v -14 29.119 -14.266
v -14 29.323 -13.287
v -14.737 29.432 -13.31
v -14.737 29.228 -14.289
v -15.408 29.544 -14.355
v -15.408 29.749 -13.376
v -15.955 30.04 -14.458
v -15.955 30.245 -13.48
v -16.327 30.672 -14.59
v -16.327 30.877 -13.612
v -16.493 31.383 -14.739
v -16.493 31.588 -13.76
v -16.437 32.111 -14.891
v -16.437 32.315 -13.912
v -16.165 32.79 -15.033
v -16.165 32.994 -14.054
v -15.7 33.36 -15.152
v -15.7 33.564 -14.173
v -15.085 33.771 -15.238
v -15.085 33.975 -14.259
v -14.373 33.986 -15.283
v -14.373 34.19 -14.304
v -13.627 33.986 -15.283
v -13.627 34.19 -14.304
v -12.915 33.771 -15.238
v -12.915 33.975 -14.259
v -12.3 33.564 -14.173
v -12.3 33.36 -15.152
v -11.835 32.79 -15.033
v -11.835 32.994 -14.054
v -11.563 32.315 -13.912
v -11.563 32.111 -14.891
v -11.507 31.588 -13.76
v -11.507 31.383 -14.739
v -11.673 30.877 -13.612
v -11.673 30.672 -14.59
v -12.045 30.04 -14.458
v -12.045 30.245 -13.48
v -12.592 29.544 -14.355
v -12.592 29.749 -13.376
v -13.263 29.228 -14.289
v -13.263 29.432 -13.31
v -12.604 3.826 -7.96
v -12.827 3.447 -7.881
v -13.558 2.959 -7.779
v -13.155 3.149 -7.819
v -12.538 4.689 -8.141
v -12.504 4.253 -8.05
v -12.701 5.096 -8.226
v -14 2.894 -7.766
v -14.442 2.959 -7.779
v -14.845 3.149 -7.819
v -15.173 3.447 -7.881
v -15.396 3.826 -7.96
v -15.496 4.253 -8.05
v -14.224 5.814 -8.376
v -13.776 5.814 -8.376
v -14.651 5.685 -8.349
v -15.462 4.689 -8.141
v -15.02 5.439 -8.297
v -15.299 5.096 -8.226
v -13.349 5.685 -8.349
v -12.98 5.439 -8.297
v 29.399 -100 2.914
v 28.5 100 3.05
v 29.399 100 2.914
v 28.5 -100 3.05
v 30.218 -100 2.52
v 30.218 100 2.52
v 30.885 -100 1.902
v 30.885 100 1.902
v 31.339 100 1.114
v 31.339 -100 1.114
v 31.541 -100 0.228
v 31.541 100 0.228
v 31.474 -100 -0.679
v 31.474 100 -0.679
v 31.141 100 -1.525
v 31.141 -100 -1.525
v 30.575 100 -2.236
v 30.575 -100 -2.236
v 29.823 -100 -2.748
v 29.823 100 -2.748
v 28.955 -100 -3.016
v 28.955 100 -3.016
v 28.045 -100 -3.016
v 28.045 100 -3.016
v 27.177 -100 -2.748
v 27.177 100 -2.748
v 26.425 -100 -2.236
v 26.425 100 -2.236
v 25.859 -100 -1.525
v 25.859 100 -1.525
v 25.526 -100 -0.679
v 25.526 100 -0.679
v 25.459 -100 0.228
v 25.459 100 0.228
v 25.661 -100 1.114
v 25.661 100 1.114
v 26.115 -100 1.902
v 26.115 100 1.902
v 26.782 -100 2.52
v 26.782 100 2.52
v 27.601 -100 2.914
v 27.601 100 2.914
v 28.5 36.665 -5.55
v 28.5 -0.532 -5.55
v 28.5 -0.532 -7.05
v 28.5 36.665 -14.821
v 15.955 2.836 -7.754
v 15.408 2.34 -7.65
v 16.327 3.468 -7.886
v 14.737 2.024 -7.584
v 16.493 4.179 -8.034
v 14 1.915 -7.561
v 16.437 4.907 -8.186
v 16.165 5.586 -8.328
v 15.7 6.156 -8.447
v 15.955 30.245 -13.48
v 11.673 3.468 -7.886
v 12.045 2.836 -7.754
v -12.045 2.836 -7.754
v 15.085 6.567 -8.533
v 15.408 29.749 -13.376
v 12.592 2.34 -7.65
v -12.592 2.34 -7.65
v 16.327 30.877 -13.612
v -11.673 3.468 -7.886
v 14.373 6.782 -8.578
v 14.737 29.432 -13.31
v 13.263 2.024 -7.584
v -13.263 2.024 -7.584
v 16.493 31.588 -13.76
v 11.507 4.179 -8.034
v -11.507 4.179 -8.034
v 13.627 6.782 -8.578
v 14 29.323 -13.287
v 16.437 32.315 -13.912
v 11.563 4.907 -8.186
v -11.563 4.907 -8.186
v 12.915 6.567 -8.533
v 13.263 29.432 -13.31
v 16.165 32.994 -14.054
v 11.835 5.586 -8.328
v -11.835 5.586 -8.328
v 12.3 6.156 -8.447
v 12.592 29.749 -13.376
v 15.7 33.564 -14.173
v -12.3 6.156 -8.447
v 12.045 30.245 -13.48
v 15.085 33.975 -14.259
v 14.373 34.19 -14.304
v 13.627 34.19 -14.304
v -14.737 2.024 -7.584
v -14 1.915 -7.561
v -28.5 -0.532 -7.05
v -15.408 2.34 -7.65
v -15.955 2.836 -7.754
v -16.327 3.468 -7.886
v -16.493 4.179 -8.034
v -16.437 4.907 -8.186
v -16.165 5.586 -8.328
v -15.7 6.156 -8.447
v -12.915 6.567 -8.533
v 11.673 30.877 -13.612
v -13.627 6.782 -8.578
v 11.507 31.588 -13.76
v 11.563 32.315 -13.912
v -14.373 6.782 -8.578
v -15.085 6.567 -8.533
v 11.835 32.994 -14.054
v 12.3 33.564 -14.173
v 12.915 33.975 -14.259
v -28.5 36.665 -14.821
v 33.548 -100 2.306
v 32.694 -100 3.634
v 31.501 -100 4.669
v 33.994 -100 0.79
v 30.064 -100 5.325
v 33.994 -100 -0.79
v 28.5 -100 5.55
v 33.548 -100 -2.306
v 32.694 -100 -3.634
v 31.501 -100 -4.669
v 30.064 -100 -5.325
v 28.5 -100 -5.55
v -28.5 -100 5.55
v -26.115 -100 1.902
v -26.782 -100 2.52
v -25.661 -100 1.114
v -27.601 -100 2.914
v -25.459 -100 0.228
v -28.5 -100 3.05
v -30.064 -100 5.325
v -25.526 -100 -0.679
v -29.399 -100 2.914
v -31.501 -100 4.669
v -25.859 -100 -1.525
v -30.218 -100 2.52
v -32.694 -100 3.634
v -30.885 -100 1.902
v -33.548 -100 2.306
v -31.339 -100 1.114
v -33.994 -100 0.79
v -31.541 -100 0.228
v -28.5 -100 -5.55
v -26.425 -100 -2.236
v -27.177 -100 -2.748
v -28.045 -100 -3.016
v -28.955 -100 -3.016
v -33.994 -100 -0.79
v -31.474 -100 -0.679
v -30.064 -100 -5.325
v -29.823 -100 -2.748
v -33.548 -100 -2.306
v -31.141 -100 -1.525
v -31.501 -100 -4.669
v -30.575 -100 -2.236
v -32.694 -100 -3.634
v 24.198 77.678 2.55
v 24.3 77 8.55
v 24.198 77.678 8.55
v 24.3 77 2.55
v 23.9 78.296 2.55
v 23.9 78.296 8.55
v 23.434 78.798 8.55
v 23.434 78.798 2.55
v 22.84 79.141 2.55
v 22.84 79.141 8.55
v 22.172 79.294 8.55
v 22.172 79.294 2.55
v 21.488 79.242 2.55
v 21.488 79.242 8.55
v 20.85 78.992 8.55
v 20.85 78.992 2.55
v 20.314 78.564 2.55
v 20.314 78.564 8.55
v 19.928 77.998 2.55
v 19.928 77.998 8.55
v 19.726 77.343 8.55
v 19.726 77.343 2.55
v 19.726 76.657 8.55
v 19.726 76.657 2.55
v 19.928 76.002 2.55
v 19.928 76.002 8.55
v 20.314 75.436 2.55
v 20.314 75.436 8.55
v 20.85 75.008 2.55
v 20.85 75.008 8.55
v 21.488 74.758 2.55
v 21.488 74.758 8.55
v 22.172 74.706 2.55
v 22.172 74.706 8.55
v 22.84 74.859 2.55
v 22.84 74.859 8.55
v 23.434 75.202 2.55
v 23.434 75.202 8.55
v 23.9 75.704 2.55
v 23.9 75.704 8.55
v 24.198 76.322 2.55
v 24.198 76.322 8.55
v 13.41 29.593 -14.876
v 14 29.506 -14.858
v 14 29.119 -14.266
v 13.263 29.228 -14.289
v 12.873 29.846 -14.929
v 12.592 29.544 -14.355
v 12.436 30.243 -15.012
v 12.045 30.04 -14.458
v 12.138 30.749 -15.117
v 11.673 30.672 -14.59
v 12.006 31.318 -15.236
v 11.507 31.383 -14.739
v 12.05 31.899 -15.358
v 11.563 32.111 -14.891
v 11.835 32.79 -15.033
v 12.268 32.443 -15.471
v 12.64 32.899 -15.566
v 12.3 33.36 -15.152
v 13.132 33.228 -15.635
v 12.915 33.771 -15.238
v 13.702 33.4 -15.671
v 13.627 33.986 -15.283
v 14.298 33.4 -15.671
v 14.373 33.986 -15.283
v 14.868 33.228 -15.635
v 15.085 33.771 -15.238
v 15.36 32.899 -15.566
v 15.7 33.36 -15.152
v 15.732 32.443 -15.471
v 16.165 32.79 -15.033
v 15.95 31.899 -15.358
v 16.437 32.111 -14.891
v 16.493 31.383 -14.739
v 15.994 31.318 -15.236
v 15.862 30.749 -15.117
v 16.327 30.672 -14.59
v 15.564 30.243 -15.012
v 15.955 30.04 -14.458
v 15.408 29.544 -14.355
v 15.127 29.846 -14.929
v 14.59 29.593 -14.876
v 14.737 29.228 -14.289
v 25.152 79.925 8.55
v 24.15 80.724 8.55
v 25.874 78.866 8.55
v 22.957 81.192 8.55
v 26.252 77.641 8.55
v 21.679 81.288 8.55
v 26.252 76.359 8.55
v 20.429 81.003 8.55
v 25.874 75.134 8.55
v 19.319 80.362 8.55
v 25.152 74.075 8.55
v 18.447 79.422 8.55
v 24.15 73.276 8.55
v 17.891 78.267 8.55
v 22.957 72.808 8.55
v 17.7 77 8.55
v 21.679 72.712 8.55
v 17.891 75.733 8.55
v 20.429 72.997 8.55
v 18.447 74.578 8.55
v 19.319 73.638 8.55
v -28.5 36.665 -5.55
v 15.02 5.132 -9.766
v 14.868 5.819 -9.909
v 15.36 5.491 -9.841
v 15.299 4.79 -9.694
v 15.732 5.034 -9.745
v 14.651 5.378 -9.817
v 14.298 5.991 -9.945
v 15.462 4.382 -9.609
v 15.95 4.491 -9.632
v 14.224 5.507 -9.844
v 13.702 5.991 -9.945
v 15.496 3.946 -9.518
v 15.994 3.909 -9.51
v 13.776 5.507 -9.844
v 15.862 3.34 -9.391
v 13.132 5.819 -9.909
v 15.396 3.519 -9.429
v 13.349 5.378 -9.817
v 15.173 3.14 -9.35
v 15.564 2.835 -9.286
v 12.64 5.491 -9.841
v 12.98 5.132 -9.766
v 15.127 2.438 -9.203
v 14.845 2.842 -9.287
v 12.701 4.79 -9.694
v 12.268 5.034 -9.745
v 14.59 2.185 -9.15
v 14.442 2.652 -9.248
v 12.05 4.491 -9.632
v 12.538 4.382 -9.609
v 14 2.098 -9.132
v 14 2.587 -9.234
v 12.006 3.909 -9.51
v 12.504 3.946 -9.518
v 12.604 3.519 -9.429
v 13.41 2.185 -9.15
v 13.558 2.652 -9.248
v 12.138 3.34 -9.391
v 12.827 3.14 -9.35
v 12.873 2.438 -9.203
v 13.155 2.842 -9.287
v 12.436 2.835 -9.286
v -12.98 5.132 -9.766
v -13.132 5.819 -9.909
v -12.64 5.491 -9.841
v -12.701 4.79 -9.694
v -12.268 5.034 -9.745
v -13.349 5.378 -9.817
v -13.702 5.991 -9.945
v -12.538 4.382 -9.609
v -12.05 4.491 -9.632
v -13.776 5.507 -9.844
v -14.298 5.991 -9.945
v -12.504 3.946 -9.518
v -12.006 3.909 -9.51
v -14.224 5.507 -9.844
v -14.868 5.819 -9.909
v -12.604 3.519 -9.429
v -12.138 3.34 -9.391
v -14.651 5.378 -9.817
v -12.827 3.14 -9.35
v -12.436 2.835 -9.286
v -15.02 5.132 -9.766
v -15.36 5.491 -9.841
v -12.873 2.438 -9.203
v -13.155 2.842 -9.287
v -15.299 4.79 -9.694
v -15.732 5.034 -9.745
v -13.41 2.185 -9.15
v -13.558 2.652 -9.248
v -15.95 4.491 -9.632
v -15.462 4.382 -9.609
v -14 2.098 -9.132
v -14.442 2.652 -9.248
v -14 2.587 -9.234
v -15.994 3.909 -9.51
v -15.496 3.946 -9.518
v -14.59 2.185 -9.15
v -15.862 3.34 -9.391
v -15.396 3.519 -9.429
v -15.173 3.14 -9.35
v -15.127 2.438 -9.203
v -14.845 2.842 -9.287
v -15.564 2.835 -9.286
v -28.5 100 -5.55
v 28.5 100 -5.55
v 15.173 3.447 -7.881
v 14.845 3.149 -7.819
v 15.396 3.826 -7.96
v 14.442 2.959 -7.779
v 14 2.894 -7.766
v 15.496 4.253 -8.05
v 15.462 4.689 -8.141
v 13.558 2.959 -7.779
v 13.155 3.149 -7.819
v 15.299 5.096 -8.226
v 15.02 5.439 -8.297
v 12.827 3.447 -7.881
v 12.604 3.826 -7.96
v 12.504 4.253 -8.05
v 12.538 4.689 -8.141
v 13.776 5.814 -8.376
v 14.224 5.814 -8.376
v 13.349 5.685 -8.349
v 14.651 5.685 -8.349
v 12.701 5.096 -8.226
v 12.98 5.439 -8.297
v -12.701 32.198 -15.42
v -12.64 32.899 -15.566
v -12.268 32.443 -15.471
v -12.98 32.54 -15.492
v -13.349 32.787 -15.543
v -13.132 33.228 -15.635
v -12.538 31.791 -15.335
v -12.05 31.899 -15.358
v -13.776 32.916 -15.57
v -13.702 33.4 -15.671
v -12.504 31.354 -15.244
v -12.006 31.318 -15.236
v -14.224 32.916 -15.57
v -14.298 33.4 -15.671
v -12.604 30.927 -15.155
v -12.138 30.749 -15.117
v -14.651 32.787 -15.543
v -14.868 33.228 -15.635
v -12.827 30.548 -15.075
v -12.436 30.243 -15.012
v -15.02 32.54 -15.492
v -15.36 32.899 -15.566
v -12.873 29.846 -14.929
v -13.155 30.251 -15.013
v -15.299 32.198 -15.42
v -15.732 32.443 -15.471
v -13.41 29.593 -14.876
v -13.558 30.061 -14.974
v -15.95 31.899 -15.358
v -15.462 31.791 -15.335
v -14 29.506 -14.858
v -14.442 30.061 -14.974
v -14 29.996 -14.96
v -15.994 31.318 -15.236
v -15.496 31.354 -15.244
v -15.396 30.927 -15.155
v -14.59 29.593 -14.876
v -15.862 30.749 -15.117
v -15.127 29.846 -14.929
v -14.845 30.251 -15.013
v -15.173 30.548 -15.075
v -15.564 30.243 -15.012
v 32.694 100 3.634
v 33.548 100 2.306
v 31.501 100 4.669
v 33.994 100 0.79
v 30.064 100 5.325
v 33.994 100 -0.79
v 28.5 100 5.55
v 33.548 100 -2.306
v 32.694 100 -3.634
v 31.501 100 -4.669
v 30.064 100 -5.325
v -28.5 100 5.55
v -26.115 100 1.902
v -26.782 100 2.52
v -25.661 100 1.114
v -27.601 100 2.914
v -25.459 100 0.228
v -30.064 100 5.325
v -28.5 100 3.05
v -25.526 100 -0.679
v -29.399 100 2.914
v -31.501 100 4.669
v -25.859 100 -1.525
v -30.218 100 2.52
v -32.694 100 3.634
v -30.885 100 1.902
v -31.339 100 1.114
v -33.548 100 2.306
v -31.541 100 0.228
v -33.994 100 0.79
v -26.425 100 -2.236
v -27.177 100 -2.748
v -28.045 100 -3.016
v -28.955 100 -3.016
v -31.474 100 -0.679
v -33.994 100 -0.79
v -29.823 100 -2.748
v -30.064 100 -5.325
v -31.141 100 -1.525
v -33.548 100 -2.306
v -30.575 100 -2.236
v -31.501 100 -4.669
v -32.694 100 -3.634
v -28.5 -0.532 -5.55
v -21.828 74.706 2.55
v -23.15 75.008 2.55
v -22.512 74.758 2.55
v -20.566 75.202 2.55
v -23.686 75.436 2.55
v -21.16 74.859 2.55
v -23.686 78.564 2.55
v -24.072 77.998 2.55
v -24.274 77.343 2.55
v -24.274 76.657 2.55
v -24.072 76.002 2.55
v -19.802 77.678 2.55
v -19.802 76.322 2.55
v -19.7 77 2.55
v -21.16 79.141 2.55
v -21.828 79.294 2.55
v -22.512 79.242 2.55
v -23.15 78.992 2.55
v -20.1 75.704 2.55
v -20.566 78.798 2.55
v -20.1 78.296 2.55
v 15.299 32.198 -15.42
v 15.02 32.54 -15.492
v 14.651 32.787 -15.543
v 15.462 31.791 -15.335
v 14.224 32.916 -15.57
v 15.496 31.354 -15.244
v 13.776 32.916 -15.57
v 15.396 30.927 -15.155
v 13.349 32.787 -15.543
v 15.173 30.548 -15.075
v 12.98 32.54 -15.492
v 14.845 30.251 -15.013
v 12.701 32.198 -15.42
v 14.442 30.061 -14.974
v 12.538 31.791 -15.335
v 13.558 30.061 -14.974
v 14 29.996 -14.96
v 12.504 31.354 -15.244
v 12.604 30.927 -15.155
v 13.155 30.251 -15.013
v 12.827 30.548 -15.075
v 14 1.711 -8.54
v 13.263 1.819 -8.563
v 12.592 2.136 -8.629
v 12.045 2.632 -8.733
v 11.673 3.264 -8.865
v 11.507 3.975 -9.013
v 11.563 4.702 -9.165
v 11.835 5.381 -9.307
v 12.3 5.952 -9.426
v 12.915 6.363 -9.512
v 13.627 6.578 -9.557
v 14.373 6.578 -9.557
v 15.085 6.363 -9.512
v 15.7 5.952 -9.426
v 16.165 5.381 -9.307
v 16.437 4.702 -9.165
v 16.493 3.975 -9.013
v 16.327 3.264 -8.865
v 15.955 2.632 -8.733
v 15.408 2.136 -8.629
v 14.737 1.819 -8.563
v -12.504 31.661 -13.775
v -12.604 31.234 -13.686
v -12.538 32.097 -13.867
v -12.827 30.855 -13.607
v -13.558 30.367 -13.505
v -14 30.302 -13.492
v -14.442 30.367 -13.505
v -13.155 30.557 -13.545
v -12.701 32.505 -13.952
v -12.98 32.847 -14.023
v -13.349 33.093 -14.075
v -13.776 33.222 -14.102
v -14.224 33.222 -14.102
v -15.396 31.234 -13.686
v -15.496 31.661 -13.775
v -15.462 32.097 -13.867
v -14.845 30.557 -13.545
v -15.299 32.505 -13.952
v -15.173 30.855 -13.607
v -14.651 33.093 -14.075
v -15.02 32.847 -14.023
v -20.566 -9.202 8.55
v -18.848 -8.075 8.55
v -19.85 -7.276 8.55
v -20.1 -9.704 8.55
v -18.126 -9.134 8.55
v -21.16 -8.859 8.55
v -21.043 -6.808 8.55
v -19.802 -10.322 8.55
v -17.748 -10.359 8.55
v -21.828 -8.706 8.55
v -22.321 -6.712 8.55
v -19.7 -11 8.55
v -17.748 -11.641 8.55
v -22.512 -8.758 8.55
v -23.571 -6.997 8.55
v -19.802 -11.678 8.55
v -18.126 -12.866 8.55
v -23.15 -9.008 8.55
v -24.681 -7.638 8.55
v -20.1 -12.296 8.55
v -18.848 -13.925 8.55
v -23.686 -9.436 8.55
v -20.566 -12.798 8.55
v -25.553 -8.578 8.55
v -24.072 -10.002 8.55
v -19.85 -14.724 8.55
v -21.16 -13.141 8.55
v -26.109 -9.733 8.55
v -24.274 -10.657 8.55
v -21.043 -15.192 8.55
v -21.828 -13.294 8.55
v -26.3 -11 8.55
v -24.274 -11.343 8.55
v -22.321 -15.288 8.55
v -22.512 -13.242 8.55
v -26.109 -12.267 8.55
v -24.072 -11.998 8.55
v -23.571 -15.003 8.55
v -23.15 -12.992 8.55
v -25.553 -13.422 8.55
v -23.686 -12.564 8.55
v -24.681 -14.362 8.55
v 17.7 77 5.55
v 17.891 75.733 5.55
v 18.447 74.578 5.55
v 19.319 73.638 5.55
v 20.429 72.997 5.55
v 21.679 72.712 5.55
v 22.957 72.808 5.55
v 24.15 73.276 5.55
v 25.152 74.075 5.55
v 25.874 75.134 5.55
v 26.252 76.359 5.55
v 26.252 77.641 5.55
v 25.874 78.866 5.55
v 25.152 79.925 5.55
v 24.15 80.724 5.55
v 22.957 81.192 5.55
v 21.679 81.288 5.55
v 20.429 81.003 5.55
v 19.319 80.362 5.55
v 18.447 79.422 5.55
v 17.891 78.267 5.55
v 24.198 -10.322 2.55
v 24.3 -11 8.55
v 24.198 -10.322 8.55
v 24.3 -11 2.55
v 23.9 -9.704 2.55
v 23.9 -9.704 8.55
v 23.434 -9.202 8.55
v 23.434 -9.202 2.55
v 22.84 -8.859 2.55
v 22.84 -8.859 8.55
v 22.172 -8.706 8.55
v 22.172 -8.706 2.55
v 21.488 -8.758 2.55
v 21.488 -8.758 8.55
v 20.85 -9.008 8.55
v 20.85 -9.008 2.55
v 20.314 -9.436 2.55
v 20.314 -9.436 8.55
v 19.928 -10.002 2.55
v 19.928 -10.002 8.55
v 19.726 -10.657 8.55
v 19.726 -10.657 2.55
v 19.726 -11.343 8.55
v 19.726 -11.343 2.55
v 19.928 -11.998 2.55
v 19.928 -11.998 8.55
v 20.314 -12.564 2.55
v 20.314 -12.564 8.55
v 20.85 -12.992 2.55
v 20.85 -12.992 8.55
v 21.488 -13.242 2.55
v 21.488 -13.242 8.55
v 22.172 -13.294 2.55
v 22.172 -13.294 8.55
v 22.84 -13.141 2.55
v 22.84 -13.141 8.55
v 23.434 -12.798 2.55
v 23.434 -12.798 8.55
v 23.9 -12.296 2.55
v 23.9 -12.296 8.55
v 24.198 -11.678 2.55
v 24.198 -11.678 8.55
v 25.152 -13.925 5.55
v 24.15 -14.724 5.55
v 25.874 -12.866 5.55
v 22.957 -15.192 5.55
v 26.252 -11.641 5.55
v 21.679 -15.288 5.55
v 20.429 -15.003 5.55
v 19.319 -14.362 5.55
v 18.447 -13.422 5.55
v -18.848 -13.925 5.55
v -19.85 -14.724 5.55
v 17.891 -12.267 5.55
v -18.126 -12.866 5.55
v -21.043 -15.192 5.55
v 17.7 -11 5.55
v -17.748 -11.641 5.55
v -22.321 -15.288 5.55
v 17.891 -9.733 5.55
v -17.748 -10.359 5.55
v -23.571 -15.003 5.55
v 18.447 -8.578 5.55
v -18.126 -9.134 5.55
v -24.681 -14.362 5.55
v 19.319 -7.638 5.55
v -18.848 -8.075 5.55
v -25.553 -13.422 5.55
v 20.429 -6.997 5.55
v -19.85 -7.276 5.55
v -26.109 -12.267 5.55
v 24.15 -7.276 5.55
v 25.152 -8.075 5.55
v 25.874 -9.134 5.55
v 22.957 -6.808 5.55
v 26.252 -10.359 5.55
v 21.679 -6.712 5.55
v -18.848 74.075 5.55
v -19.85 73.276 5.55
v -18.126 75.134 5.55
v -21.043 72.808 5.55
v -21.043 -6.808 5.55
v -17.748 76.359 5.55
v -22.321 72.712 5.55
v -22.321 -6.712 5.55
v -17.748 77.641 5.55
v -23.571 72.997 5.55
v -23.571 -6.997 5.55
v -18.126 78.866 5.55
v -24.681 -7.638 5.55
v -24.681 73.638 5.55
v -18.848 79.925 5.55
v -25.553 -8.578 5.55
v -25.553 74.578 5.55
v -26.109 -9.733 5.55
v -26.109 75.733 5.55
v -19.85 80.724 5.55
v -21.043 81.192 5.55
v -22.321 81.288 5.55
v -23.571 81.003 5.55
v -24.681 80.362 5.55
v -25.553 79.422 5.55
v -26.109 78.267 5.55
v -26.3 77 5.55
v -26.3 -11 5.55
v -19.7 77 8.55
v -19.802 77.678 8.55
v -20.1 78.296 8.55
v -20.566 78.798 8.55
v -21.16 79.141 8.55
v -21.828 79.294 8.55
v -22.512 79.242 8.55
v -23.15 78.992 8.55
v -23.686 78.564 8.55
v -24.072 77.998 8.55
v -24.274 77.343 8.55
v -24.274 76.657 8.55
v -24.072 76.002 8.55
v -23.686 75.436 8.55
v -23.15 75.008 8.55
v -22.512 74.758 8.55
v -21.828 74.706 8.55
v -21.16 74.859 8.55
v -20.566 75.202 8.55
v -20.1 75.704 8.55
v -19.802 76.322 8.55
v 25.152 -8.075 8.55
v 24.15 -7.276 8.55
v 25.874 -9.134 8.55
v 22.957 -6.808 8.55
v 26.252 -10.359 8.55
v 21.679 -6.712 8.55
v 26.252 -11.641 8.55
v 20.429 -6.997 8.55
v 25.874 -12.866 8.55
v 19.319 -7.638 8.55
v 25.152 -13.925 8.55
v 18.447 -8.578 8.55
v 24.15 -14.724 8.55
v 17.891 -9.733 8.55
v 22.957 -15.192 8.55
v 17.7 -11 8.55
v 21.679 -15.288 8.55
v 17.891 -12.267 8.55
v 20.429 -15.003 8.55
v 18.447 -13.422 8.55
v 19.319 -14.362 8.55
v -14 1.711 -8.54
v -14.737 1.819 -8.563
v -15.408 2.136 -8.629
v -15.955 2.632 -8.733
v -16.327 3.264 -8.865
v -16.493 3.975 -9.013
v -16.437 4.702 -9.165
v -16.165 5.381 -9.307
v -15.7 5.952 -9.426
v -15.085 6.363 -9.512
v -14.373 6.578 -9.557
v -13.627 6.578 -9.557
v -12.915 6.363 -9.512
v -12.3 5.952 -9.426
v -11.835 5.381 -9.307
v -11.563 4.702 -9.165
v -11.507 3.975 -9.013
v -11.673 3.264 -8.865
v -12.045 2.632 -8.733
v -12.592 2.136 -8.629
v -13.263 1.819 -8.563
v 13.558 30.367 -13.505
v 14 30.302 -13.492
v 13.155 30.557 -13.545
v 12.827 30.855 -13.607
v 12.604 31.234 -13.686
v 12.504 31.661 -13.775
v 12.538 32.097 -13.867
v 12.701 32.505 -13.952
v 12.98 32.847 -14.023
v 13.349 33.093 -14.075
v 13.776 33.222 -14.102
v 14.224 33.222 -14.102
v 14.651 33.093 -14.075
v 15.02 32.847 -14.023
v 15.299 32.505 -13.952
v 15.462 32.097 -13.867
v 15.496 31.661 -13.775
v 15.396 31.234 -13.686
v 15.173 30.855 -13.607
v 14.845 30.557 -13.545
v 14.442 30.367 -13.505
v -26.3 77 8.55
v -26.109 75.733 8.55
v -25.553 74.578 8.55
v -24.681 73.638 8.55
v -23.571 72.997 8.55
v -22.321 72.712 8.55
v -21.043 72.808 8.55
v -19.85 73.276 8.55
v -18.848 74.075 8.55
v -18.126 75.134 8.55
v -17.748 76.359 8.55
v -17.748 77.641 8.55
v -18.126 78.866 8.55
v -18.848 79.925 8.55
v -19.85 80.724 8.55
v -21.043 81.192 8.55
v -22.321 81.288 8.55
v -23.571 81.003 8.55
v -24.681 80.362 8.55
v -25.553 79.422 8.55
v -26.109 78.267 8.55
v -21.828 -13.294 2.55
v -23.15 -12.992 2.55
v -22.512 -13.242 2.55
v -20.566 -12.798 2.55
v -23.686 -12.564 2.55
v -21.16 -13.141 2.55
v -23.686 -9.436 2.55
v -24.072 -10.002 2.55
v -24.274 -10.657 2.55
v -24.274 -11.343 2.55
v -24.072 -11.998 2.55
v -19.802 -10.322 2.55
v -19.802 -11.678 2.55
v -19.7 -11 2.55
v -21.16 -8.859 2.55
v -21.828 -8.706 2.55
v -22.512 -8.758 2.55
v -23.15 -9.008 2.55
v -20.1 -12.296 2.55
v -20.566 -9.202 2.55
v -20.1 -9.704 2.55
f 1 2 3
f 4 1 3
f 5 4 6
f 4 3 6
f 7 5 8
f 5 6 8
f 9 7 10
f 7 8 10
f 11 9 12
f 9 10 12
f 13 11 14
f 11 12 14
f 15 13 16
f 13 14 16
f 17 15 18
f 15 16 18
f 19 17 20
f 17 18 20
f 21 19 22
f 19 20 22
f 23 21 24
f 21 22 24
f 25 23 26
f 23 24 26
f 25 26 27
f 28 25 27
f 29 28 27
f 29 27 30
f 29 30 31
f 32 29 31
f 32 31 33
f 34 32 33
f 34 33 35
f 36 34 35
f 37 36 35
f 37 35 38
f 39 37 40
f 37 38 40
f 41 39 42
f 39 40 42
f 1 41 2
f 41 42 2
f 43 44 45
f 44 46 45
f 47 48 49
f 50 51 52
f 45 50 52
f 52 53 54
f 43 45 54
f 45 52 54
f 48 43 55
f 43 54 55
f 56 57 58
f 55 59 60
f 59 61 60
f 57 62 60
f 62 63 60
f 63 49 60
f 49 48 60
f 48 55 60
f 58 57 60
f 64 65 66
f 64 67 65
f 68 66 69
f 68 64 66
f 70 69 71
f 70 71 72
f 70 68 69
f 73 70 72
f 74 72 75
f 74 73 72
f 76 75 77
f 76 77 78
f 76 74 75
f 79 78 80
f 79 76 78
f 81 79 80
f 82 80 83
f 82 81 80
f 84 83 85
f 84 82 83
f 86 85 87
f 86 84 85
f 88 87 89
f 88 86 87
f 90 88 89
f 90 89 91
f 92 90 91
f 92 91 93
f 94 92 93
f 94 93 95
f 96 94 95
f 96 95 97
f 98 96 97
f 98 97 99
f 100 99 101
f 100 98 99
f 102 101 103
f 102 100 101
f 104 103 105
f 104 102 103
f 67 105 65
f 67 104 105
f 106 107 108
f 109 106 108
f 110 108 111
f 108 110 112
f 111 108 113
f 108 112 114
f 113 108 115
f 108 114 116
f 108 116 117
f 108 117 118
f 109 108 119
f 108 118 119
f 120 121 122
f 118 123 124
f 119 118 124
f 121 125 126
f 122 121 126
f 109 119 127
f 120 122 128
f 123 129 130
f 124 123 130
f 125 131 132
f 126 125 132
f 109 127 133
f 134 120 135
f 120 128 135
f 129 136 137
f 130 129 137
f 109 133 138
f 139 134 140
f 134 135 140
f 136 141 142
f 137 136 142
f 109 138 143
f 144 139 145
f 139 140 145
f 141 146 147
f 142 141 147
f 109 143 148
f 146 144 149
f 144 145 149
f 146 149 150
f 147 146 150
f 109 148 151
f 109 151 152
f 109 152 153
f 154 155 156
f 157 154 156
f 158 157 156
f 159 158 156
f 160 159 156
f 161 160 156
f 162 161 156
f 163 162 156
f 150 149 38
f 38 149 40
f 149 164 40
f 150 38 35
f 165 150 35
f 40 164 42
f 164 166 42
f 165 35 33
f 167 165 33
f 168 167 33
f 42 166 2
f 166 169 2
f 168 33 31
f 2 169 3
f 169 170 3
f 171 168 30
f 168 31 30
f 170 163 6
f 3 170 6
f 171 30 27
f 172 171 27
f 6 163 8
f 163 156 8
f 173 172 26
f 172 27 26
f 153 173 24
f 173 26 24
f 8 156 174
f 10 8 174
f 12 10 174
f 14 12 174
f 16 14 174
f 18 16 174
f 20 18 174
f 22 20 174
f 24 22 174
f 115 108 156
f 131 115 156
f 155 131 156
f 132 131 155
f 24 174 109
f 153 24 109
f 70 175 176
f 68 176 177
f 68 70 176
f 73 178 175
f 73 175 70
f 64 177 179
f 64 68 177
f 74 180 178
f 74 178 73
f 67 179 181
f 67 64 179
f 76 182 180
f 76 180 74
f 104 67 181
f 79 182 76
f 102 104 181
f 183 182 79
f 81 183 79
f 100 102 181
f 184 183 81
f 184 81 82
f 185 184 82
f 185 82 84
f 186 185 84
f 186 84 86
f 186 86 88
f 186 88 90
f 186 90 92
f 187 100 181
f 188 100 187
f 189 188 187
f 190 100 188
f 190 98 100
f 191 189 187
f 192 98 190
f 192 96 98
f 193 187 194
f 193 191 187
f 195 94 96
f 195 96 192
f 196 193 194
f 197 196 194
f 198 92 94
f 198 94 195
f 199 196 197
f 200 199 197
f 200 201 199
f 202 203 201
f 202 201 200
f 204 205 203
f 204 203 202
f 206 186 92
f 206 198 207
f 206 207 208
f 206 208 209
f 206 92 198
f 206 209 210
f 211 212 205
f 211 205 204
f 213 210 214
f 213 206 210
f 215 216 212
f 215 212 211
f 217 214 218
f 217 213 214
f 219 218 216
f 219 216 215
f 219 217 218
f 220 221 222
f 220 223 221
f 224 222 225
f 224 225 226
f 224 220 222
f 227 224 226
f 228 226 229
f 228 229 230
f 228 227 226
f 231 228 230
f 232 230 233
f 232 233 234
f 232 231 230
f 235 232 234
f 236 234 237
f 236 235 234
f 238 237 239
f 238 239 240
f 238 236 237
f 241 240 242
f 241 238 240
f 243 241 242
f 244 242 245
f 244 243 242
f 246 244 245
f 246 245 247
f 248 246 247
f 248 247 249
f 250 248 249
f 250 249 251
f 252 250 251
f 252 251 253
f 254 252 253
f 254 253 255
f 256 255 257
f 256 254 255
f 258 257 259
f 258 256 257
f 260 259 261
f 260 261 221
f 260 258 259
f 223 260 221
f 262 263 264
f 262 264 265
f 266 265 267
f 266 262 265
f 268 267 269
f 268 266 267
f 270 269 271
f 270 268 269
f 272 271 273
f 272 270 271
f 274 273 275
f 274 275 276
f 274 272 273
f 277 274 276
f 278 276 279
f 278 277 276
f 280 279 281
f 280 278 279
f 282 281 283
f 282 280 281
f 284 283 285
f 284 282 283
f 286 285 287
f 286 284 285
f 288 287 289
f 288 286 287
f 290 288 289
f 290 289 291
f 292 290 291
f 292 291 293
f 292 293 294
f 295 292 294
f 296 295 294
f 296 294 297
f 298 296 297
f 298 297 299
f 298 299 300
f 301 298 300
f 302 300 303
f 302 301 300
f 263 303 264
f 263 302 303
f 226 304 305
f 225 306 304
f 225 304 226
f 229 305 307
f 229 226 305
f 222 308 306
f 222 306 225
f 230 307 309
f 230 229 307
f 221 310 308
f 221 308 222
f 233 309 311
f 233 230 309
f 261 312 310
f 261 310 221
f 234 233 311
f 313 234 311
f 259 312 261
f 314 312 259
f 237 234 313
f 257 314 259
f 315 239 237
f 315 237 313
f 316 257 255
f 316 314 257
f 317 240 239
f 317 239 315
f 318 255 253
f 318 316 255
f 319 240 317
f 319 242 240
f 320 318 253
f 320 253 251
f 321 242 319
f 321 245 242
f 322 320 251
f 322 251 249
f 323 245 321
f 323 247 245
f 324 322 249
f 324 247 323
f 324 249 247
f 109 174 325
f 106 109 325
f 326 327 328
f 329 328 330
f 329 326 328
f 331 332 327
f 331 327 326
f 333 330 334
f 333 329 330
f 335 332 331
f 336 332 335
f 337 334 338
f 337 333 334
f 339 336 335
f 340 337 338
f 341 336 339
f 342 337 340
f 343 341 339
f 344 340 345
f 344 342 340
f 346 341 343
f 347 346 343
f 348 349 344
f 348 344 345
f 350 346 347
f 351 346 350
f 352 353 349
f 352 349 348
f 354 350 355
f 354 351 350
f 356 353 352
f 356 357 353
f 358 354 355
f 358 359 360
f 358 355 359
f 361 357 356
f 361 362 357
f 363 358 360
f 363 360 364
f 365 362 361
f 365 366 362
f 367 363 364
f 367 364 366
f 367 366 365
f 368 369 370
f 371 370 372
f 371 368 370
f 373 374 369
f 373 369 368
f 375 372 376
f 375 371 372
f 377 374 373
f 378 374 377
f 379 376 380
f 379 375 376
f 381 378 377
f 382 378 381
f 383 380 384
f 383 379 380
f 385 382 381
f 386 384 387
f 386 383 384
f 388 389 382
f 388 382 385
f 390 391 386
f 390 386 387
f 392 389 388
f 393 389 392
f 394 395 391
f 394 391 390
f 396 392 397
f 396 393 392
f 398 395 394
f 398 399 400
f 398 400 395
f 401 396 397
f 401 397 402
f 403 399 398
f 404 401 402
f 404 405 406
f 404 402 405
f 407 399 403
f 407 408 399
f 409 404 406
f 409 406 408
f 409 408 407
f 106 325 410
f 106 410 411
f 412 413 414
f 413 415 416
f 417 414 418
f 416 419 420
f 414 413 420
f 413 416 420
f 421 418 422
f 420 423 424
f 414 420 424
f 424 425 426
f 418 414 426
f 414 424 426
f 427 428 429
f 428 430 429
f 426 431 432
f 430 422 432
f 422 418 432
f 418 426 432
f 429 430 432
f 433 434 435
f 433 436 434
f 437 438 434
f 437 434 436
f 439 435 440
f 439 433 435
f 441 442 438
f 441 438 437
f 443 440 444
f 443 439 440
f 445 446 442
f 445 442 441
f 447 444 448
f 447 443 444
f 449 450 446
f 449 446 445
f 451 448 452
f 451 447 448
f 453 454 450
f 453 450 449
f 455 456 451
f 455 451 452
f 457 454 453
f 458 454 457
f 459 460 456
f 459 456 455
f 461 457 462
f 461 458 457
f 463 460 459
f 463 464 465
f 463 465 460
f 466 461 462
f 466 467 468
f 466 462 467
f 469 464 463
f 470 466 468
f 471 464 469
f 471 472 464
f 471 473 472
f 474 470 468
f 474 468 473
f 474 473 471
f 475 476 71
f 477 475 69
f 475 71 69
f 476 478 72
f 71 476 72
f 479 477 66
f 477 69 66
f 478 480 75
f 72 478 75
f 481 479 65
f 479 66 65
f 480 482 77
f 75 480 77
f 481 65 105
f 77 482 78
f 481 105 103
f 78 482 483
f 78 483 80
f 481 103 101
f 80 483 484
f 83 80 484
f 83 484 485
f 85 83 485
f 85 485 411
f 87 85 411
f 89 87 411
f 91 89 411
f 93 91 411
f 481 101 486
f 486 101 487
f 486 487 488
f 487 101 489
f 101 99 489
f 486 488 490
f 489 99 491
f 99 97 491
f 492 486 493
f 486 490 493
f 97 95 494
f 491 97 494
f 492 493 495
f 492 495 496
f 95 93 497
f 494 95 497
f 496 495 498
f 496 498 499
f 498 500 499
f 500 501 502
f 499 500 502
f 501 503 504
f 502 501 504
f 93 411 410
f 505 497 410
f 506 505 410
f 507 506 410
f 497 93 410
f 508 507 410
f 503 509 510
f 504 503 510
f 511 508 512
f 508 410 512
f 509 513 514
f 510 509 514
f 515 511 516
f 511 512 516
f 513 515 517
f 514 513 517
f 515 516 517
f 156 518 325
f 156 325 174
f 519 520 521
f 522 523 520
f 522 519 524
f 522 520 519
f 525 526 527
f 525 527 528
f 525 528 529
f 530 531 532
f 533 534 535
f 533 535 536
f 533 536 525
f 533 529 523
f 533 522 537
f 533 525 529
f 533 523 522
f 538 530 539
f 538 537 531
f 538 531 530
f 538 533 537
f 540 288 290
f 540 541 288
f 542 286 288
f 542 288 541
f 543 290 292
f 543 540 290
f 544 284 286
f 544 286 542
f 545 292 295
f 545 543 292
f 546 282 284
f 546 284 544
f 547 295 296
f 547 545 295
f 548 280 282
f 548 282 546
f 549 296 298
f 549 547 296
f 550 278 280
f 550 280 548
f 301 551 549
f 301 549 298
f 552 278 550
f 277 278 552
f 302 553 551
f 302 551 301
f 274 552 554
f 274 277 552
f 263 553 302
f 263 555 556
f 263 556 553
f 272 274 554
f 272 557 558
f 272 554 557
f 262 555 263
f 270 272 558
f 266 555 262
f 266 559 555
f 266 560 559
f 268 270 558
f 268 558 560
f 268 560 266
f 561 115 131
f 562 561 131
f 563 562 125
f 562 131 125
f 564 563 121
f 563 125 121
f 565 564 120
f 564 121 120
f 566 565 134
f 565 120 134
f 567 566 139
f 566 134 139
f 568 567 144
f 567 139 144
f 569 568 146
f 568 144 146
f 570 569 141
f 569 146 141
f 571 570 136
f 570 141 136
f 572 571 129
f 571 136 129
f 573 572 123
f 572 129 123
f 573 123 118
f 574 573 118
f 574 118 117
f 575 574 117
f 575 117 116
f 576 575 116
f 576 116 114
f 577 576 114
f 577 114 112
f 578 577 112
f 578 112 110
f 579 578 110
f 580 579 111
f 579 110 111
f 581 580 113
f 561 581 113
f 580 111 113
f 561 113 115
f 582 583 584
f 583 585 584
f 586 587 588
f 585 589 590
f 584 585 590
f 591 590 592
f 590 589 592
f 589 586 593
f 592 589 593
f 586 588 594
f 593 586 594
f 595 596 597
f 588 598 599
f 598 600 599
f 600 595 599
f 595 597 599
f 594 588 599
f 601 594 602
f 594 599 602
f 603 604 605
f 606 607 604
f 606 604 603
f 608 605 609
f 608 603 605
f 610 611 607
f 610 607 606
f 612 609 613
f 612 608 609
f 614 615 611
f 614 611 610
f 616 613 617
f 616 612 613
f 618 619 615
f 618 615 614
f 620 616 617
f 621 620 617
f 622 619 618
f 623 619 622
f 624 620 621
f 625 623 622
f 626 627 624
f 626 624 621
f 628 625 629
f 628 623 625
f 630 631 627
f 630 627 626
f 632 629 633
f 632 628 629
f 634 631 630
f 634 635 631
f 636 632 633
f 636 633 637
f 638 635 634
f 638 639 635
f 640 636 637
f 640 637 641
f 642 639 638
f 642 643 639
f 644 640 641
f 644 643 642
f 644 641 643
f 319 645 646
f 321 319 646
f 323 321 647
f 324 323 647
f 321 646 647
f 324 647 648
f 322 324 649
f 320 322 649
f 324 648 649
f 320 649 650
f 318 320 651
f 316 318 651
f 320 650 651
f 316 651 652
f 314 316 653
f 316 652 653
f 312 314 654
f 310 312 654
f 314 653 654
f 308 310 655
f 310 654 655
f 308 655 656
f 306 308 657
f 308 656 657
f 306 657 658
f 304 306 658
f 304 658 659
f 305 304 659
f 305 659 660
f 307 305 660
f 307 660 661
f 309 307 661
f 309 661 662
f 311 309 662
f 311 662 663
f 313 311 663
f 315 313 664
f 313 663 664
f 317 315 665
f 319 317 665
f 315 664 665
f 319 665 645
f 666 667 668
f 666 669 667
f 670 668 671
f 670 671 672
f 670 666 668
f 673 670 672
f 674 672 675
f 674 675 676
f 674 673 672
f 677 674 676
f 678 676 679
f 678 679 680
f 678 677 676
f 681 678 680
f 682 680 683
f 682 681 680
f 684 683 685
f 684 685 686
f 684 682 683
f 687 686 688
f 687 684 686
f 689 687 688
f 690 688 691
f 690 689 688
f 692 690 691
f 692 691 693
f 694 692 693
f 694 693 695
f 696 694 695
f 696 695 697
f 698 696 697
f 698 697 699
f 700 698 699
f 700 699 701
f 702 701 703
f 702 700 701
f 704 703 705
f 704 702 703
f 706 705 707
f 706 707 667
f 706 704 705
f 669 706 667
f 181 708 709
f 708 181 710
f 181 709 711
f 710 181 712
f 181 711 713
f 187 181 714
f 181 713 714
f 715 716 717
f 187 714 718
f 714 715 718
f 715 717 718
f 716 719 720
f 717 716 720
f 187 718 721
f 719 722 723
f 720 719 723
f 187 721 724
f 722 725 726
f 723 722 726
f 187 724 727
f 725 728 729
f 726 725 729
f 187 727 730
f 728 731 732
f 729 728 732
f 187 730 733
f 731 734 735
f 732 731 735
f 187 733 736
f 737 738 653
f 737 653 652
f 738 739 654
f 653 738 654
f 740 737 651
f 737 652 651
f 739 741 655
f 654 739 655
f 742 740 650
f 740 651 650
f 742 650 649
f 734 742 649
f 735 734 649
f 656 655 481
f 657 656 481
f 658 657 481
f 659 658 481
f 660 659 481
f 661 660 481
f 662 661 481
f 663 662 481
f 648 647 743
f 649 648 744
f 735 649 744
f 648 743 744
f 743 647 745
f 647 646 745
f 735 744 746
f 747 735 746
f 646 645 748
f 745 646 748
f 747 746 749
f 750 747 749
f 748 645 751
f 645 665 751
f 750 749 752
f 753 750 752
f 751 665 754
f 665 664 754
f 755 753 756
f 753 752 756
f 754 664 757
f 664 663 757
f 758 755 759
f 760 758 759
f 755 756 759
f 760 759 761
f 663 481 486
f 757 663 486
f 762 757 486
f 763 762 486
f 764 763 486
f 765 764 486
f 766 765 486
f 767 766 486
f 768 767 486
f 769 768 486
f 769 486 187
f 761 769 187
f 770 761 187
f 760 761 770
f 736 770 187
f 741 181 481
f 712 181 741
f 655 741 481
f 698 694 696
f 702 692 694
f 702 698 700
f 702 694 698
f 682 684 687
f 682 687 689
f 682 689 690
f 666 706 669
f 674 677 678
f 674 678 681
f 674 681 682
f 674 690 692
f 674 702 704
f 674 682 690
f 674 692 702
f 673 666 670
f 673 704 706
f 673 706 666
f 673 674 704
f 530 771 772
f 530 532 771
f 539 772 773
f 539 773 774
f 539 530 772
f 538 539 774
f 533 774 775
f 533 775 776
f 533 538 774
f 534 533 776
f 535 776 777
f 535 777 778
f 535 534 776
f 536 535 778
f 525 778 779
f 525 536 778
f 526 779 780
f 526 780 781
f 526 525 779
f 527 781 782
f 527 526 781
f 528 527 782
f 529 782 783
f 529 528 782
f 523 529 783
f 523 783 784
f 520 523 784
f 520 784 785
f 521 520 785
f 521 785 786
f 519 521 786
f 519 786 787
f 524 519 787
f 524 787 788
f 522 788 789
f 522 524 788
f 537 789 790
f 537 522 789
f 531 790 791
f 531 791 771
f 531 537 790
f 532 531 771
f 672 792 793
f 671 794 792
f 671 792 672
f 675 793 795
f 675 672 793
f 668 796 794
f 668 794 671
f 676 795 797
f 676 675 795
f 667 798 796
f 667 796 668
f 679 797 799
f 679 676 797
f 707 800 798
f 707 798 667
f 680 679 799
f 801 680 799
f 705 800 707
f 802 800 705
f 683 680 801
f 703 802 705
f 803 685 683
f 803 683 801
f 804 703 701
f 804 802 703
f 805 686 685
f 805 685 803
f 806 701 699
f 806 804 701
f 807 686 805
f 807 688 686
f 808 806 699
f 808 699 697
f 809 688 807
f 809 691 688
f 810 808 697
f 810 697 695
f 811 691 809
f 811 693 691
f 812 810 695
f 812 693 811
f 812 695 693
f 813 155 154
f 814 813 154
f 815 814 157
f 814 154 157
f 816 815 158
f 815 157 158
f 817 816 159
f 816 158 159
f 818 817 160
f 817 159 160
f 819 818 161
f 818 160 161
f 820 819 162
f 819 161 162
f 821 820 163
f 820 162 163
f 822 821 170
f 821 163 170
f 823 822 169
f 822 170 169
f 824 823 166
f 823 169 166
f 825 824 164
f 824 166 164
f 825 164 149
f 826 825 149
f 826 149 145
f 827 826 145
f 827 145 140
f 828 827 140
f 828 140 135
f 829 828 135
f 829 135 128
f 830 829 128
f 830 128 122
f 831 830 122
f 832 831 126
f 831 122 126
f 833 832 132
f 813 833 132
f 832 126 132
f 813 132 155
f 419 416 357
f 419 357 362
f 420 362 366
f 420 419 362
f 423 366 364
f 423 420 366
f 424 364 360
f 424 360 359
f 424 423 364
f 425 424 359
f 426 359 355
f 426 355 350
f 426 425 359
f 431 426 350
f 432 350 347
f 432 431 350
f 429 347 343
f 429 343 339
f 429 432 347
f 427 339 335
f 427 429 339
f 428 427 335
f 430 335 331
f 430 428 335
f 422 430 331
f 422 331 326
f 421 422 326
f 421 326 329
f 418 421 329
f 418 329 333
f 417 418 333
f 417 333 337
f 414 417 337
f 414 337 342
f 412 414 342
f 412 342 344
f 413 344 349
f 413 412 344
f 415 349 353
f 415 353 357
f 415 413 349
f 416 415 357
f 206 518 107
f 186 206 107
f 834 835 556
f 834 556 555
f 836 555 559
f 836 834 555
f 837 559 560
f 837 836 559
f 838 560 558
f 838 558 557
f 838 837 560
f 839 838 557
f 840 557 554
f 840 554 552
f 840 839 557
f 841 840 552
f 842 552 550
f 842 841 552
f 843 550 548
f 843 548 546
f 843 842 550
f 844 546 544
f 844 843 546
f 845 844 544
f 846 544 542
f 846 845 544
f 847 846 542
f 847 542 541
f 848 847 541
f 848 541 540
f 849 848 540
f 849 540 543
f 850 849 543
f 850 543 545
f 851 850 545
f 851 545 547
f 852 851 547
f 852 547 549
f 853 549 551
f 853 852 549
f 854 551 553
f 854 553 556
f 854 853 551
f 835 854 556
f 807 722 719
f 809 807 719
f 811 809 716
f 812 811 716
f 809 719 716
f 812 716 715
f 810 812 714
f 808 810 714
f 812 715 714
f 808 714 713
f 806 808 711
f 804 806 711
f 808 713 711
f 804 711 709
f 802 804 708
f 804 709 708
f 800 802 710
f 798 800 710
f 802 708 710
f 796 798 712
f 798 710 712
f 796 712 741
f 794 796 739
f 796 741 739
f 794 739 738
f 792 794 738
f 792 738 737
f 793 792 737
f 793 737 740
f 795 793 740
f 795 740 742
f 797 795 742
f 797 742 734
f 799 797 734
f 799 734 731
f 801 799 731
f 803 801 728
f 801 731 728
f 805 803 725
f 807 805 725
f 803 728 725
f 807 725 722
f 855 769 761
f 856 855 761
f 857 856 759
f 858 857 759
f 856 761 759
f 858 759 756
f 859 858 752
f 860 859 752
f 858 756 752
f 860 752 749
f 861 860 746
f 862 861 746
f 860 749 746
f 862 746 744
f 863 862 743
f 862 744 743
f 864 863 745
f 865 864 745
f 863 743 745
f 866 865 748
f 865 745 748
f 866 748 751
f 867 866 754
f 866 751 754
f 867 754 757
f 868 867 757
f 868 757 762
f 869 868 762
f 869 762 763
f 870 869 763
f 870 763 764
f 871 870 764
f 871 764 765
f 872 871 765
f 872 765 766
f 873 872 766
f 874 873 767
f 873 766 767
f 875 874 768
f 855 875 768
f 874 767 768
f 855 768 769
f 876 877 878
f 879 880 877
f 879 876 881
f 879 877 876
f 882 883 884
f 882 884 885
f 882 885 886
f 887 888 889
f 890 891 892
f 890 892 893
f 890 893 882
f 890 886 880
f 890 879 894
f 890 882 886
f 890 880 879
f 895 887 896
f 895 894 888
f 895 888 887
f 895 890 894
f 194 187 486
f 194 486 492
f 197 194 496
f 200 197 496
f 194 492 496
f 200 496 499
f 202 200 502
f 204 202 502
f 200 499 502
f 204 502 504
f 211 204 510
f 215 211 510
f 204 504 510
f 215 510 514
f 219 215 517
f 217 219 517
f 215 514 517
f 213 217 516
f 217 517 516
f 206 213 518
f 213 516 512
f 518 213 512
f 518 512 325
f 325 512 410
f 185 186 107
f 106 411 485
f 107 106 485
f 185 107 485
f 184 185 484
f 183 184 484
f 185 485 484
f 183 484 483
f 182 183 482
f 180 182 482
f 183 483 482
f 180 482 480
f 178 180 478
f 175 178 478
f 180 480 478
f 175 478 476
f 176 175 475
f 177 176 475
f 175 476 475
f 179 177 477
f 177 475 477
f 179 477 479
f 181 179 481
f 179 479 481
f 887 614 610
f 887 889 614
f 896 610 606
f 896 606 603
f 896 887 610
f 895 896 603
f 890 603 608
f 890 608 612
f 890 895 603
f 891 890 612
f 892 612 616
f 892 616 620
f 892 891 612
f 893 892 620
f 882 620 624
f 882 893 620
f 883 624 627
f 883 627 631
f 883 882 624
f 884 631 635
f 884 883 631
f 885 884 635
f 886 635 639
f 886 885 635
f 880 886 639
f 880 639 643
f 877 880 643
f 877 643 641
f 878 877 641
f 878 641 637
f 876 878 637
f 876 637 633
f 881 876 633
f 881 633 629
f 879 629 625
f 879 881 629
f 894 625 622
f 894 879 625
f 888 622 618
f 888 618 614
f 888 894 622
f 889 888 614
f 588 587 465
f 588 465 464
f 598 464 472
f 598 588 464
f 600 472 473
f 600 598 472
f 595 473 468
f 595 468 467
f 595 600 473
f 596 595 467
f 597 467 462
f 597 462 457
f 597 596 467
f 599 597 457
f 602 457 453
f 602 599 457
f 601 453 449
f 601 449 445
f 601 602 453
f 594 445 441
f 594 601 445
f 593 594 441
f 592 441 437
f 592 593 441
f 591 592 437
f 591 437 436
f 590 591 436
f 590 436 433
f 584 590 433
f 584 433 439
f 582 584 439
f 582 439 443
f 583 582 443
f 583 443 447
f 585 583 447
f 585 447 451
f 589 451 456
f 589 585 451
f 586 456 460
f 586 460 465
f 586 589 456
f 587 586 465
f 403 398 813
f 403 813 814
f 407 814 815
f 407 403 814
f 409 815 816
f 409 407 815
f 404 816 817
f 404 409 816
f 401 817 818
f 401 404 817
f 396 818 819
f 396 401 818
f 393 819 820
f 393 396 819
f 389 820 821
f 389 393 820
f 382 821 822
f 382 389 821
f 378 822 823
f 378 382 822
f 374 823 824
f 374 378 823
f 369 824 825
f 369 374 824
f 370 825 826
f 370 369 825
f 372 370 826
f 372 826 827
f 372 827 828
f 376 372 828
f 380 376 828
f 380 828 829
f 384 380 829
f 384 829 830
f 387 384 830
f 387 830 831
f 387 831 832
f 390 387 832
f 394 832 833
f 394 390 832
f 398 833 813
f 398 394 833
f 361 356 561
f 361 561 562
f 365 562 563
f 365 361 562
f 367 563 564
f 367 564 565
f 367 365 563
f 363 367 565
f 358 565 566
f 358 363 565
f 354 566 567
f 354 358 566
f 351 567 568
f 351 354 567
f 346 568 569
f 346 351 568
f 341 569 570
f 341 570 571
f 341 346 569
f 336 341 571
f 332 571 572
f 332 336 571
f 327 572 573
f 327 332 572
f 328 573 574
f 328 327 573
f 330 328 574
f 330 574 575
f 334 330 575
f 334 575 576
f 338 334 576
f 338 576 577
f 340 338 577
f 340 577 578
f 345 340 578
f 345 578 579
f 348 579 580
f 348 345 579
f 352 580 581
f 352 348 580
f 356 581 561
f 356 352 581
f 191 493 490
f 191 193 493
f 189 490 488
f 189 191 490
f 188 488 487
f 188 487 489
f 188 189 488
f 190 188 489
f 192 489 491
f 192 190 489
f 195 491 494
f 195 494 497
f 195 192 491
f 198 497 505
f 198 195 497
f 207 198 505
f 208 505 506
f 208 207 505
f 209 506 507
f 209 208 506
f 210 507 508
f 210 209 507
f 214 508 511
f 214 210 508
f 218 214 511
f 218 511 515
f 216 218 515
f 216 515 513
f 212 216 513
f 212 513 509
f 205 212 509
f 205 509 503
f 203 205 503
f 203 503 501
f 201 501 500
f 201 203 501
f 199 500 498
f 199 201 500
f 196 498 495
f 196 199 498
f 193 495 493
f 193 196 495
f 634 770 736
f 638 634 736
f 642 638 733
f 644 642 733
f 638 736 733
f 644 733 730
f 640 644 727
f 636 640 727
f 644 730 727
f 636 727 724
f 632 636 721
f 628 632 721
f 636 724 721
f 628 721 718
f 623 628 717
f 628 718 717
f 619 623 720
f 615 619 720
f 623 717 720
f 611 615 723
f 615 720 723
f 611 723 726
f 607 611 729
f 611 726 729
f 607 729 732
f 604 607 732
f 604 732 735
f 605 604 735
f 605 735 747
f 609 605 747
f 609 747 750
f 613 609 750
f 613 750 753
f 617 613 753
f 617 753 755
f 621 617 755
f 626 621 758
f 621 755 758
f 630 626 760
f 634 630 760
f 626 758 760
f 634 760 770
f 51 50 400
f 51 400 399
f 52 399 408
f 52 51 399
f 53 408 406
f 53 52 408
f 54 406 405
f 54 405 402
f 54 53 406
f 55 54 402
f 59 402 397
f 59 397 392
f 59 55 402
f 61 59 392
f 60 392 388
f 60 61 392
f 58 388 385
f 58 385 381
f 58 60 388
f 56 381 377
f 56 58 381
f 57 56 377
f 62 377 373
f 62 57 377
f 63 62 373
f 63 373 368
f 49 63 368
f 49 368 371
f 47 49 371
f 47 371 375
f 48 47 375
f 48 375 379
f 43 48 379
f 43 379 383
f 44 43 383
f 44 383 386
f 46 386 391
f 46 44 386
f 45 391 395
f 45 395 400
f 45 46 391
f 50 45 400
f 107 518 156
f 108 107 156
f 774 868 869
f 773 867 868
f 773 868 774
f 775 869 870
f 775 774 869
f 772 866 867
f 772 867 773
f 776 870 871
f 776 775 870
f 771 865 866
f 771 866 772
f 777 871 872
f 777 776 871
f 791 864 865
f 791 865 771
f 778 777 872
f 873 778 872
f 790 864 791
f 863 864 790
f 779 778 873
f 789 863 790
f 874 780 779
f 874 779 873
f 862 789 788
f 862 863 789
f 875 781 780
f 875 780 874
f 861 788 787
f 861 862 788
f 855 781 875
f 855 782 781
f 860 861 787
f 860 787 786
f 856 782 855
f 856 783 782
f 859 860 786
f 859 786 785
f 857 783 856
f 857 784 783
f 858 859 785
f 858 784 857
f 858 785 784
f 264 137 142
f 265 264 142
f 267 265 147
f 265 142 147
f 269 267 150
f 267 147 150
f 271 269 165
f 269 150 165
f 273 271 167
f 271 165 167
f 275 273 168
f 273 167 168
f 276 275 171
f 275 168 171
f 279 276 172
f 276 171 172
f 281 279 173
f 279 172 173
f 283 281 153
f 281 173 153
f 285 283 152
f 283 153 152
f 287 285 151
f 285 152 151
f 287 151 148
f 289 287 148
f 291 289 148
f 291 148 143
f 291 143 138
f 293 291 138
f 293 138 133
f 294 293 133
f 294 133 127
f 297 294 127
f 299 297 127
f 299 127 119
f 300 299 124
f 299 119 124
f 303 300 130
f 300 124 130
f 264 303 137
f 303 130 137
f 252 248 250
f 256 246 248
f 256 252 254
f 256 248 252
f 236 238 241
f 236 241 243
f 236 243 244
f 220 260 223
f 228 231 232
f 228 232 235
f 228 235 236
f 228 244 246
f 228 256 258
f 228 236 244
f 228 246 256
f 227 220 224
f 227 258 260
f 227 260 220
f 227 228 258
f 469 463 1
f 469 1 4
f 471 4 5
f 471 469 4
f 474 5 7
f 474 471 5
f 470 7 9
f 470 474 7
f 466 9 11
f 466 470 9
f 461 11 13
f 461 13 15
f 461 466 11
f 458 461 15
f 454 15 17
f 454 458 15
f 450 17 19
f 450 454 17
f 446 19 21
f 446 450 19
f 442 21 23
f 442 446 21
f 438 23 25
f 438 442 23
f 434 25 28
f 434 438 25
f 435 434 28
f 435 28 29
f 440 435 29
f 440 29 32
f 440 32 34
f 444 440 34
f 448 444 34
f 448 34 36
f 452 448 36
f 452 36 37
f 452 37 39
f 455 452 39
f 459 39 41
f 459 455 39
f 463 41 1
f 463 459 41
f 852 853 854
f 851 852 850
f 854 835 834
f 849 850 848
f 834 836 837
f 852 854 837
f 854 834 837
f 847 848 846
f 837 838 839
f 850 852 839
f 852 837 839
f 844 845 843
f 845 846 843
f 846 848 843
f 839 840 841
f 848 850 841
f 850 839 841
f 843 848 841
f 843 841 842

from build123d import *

# Parameters (mm, degrees)
SKETCH1_R                = 3.05
BOSS_EXTRUDE1_DEPTH      = 100
BOSS_EXTRUDE2_DEPTH      = 28.5
BOSS_EXTRUDE2_DEPTH_BACK = 28.5
SKETCH3_R                = 2.5
SKETCH3_R_2              = 1.5
BOSS_EXTRUDE3_DEPTH      = 1.5
CHAMFER1_SIZE            = 0.5
SKETCH4_R                = 4.3
SKETCH4_R_2              = 2.3
BOSS_EXTRUDE4_DEPTH      = 3
CUT_EXTRUDE1_START       = -3
SKETCH4_2_R              = 2.3
CUT_EXTRUDE1_DEPTH       = 3


with BuildPart() as part:
    # Sketch1 → Boss-Extrude1 (new, symmetric)
    with BuildSketch(Plane(origin=(0, 0, 0), x_dir=(1, 0, 0), z_dir=(0, 1, 0))):
        with BuildLine():
            Line((-28.5, 5.55), (28.5, 5.55))
            ThreePointArc((28.5, 5.55), (34.05, 0), (28.5, -5.55))
            Line((28.5, -5.55), (-28.5, -5.55))
            ThreePointArc((-28.5, -5.55), (-34.05, 0), (-28.5, 5.55))
        make_face()
        with Locations(Location((-28.5, 0, 0), (0, 0, 270))):
            Circle(SKETCH1_R, mode=Mode.SUBTRACT)
        with Locations(Location((28.5, 0, 0), (0, 0, 270))):
            Circle(SKETCH1_R, mode=Mode.SUBTRACT)
    extrude(amount=BOSS_EXTRUDE1_DEPTH, both=True)

    # Sketch2 → Boss-Extrude2 (add, two sides: drawn at the far end of the back side and taken through both)
    with BuildSketch(Plane(origin=(0, 0, 0), x_dir=(0, 0, -1), z_dir=(1, 0, 0)).offset(-BOSS_EXTRUDE2_DEPTH_BACK)):
        Polygon((5.55, 36.664900987), (5.55, -0.532059786), (7.05, -0.532059786), (14.82084997, 36.664900987), align=None)
    extrude(amount=BOSS_EXTRUDE2_DEPTH + BOSS_EXTRUDE2_DEPTH_BACK)

    # Sketch3 → Boss-Extrude3 (add)
    # profile 1 of 4: a face of its own
    with BuildSketch(Plane(origin=(0, -1.433480354, -6.861683432), x_dir=(-1, 0, 0), z_dir=(0, -0.20449605184178382, -0.9788673887616864))):
        with Locations(Location((-14, 33.920881193, 0), (0, 0, 270))):
            Circle(SKETCH3_R)
        with Locations(Location((-14, 33.920881193, 0), (0, 0, 270))):
            Circle(SKETCH3_R_2, mode=Mode.SUBTRACT)
    # profile 2 of 4: a face of its own
    with BuildSketch(Plane(origin=(0, -1.433480354, -6.861683432), x_dir=(-1, 0, 0), z_dir=(0, -0.20449605184178382, -0.9788673887616864))):
        with Locations(Location((14, 33.920881193, 0), (0, 0, 270))):
            Circle(SKETCH3_R)
        with Locations(Location((14, 33.920881193, 0), (0, 0, 270))):
            Circle(SKETCH3_R_2, mode=Mode.SUBTRACT)
    # profile 3 of 4: a face of its own
    with BuildSketch(Plane(origin=(0, -1.433480354, -6.861683432), x_dir=(-1, 0, 0), z_dir=(0, -0.20449605184178382, -0.9788673887616864))):
        with Locations(Location((14, 5.920881193, 0), (0, 0, 270))):
            Circle(SKETCH3_R)
        with Locations(Location((14, 5.920881193, 0), (0, 0, 270))):
            Circle(SKETCH3_R_2, mode=Mode.SUBTRACT)
    # profile 4 of 4: a face of its own
    with BuildSketch(Plane(origin=(0, -1.433480354, -6.861683432), x_dir=(-1, 0, 0), z_dir=(0, -0.20449605184178382, -0.9788673887616864))):
        with Locations(Location((-14, 5.920881193, 0), (0, 0, 270))):
            Circle(SKETCH3_R)
        with Locations(Location((-14, 5.920881193, 0), (0, 0, 270))):
            Circle(SKETCH3_R_2, mode=Mode.SUBTRACT)
    extrude(amount=BOSS_EXTRUDE3_DEPTH)

    # Chamfer1
    chamfer1_edges = [part.edges().sort_by_distance(p)[0] for p in [
        (14, 33.910988438, -15.777910924),
        (-14, 33.910988438, -15.777910924),
        (-14, 6.502701552, -10.052021472),
        (14, 6.502701552, -10.052021472),
    ]]
    chamfer(chamfer1_edges, length=CHAMFER1_SIZE)

    # Sketch4 → Boss-Extrude4 (add)
    # profile 1 of 4: a face of its own
    with BuildSketch(Plane.XY.offset(5.55)):
        with Locations(Location((-22, 77, 0), (0, 0, 180))):
            Circle(SKETCH4_R)
        with Locations((-22, 77)):
            Circle(SKETCH4_R_2, mode=Mode.SUBTRACT)
    # profile 2 of 4: a face of its own
    with BuildSketch(Plane.XY.offset(5.55)):
        with Locations(Location((22, 77, 0), (0, 0, 180))):
            Circle(SKETCH4_R)
        with Locations((22, 77)):
            Circle(SKETCH4_R_2, mode=Mode.SUBTRACT)
    # profile 3 of 4: a face of its own
    with BuildSketch(Plane.XY.offset(5.55)):
        with Locations(Location((-22, -11, 0), (0, 0, 180))):
            Circle(SKETCH4_R)
        with Locations((-22, -11)):
            Circle(SKETCH4_R_2, mode=Mode.SUBTRACT)
    # profile 4 of 4: a face of its own
    with BuildSketch(Plane.XY.offset(5.55)):
        with Locations(Location((22, -11, 0), (0, 0, 180))):
            Circle(SKETCH4_R)
        with Locations((22, -11)):
            Circle(SKETCH4_R_2, mode=Mode.SUBTRACT)
    extrude(amount=BOSS_EXTRUDE4_DEPTH)

    # Sketch4<2> → Cut-Extrude1 (cut)
    with BuildSketch(Plane.XY.offset(5.55).offset(CUT_EXTRUDE1_START)):
        with Locations((22, 77)):
            Circle(SKETCH4_2_R)
        with Locations((-22, 77)):
            Circle(SKETCH4_2_R)
        with Locations((22, -11)):
            Circle(SKETCH4_2_R)
        with Locations((-22, -11)):
            Circle(SKETCH4_2_R)
    extrude(amount=CUT_EXTRUDE1_DEPTH, mode=Mode.SUBTRACT)


solid = part.part
